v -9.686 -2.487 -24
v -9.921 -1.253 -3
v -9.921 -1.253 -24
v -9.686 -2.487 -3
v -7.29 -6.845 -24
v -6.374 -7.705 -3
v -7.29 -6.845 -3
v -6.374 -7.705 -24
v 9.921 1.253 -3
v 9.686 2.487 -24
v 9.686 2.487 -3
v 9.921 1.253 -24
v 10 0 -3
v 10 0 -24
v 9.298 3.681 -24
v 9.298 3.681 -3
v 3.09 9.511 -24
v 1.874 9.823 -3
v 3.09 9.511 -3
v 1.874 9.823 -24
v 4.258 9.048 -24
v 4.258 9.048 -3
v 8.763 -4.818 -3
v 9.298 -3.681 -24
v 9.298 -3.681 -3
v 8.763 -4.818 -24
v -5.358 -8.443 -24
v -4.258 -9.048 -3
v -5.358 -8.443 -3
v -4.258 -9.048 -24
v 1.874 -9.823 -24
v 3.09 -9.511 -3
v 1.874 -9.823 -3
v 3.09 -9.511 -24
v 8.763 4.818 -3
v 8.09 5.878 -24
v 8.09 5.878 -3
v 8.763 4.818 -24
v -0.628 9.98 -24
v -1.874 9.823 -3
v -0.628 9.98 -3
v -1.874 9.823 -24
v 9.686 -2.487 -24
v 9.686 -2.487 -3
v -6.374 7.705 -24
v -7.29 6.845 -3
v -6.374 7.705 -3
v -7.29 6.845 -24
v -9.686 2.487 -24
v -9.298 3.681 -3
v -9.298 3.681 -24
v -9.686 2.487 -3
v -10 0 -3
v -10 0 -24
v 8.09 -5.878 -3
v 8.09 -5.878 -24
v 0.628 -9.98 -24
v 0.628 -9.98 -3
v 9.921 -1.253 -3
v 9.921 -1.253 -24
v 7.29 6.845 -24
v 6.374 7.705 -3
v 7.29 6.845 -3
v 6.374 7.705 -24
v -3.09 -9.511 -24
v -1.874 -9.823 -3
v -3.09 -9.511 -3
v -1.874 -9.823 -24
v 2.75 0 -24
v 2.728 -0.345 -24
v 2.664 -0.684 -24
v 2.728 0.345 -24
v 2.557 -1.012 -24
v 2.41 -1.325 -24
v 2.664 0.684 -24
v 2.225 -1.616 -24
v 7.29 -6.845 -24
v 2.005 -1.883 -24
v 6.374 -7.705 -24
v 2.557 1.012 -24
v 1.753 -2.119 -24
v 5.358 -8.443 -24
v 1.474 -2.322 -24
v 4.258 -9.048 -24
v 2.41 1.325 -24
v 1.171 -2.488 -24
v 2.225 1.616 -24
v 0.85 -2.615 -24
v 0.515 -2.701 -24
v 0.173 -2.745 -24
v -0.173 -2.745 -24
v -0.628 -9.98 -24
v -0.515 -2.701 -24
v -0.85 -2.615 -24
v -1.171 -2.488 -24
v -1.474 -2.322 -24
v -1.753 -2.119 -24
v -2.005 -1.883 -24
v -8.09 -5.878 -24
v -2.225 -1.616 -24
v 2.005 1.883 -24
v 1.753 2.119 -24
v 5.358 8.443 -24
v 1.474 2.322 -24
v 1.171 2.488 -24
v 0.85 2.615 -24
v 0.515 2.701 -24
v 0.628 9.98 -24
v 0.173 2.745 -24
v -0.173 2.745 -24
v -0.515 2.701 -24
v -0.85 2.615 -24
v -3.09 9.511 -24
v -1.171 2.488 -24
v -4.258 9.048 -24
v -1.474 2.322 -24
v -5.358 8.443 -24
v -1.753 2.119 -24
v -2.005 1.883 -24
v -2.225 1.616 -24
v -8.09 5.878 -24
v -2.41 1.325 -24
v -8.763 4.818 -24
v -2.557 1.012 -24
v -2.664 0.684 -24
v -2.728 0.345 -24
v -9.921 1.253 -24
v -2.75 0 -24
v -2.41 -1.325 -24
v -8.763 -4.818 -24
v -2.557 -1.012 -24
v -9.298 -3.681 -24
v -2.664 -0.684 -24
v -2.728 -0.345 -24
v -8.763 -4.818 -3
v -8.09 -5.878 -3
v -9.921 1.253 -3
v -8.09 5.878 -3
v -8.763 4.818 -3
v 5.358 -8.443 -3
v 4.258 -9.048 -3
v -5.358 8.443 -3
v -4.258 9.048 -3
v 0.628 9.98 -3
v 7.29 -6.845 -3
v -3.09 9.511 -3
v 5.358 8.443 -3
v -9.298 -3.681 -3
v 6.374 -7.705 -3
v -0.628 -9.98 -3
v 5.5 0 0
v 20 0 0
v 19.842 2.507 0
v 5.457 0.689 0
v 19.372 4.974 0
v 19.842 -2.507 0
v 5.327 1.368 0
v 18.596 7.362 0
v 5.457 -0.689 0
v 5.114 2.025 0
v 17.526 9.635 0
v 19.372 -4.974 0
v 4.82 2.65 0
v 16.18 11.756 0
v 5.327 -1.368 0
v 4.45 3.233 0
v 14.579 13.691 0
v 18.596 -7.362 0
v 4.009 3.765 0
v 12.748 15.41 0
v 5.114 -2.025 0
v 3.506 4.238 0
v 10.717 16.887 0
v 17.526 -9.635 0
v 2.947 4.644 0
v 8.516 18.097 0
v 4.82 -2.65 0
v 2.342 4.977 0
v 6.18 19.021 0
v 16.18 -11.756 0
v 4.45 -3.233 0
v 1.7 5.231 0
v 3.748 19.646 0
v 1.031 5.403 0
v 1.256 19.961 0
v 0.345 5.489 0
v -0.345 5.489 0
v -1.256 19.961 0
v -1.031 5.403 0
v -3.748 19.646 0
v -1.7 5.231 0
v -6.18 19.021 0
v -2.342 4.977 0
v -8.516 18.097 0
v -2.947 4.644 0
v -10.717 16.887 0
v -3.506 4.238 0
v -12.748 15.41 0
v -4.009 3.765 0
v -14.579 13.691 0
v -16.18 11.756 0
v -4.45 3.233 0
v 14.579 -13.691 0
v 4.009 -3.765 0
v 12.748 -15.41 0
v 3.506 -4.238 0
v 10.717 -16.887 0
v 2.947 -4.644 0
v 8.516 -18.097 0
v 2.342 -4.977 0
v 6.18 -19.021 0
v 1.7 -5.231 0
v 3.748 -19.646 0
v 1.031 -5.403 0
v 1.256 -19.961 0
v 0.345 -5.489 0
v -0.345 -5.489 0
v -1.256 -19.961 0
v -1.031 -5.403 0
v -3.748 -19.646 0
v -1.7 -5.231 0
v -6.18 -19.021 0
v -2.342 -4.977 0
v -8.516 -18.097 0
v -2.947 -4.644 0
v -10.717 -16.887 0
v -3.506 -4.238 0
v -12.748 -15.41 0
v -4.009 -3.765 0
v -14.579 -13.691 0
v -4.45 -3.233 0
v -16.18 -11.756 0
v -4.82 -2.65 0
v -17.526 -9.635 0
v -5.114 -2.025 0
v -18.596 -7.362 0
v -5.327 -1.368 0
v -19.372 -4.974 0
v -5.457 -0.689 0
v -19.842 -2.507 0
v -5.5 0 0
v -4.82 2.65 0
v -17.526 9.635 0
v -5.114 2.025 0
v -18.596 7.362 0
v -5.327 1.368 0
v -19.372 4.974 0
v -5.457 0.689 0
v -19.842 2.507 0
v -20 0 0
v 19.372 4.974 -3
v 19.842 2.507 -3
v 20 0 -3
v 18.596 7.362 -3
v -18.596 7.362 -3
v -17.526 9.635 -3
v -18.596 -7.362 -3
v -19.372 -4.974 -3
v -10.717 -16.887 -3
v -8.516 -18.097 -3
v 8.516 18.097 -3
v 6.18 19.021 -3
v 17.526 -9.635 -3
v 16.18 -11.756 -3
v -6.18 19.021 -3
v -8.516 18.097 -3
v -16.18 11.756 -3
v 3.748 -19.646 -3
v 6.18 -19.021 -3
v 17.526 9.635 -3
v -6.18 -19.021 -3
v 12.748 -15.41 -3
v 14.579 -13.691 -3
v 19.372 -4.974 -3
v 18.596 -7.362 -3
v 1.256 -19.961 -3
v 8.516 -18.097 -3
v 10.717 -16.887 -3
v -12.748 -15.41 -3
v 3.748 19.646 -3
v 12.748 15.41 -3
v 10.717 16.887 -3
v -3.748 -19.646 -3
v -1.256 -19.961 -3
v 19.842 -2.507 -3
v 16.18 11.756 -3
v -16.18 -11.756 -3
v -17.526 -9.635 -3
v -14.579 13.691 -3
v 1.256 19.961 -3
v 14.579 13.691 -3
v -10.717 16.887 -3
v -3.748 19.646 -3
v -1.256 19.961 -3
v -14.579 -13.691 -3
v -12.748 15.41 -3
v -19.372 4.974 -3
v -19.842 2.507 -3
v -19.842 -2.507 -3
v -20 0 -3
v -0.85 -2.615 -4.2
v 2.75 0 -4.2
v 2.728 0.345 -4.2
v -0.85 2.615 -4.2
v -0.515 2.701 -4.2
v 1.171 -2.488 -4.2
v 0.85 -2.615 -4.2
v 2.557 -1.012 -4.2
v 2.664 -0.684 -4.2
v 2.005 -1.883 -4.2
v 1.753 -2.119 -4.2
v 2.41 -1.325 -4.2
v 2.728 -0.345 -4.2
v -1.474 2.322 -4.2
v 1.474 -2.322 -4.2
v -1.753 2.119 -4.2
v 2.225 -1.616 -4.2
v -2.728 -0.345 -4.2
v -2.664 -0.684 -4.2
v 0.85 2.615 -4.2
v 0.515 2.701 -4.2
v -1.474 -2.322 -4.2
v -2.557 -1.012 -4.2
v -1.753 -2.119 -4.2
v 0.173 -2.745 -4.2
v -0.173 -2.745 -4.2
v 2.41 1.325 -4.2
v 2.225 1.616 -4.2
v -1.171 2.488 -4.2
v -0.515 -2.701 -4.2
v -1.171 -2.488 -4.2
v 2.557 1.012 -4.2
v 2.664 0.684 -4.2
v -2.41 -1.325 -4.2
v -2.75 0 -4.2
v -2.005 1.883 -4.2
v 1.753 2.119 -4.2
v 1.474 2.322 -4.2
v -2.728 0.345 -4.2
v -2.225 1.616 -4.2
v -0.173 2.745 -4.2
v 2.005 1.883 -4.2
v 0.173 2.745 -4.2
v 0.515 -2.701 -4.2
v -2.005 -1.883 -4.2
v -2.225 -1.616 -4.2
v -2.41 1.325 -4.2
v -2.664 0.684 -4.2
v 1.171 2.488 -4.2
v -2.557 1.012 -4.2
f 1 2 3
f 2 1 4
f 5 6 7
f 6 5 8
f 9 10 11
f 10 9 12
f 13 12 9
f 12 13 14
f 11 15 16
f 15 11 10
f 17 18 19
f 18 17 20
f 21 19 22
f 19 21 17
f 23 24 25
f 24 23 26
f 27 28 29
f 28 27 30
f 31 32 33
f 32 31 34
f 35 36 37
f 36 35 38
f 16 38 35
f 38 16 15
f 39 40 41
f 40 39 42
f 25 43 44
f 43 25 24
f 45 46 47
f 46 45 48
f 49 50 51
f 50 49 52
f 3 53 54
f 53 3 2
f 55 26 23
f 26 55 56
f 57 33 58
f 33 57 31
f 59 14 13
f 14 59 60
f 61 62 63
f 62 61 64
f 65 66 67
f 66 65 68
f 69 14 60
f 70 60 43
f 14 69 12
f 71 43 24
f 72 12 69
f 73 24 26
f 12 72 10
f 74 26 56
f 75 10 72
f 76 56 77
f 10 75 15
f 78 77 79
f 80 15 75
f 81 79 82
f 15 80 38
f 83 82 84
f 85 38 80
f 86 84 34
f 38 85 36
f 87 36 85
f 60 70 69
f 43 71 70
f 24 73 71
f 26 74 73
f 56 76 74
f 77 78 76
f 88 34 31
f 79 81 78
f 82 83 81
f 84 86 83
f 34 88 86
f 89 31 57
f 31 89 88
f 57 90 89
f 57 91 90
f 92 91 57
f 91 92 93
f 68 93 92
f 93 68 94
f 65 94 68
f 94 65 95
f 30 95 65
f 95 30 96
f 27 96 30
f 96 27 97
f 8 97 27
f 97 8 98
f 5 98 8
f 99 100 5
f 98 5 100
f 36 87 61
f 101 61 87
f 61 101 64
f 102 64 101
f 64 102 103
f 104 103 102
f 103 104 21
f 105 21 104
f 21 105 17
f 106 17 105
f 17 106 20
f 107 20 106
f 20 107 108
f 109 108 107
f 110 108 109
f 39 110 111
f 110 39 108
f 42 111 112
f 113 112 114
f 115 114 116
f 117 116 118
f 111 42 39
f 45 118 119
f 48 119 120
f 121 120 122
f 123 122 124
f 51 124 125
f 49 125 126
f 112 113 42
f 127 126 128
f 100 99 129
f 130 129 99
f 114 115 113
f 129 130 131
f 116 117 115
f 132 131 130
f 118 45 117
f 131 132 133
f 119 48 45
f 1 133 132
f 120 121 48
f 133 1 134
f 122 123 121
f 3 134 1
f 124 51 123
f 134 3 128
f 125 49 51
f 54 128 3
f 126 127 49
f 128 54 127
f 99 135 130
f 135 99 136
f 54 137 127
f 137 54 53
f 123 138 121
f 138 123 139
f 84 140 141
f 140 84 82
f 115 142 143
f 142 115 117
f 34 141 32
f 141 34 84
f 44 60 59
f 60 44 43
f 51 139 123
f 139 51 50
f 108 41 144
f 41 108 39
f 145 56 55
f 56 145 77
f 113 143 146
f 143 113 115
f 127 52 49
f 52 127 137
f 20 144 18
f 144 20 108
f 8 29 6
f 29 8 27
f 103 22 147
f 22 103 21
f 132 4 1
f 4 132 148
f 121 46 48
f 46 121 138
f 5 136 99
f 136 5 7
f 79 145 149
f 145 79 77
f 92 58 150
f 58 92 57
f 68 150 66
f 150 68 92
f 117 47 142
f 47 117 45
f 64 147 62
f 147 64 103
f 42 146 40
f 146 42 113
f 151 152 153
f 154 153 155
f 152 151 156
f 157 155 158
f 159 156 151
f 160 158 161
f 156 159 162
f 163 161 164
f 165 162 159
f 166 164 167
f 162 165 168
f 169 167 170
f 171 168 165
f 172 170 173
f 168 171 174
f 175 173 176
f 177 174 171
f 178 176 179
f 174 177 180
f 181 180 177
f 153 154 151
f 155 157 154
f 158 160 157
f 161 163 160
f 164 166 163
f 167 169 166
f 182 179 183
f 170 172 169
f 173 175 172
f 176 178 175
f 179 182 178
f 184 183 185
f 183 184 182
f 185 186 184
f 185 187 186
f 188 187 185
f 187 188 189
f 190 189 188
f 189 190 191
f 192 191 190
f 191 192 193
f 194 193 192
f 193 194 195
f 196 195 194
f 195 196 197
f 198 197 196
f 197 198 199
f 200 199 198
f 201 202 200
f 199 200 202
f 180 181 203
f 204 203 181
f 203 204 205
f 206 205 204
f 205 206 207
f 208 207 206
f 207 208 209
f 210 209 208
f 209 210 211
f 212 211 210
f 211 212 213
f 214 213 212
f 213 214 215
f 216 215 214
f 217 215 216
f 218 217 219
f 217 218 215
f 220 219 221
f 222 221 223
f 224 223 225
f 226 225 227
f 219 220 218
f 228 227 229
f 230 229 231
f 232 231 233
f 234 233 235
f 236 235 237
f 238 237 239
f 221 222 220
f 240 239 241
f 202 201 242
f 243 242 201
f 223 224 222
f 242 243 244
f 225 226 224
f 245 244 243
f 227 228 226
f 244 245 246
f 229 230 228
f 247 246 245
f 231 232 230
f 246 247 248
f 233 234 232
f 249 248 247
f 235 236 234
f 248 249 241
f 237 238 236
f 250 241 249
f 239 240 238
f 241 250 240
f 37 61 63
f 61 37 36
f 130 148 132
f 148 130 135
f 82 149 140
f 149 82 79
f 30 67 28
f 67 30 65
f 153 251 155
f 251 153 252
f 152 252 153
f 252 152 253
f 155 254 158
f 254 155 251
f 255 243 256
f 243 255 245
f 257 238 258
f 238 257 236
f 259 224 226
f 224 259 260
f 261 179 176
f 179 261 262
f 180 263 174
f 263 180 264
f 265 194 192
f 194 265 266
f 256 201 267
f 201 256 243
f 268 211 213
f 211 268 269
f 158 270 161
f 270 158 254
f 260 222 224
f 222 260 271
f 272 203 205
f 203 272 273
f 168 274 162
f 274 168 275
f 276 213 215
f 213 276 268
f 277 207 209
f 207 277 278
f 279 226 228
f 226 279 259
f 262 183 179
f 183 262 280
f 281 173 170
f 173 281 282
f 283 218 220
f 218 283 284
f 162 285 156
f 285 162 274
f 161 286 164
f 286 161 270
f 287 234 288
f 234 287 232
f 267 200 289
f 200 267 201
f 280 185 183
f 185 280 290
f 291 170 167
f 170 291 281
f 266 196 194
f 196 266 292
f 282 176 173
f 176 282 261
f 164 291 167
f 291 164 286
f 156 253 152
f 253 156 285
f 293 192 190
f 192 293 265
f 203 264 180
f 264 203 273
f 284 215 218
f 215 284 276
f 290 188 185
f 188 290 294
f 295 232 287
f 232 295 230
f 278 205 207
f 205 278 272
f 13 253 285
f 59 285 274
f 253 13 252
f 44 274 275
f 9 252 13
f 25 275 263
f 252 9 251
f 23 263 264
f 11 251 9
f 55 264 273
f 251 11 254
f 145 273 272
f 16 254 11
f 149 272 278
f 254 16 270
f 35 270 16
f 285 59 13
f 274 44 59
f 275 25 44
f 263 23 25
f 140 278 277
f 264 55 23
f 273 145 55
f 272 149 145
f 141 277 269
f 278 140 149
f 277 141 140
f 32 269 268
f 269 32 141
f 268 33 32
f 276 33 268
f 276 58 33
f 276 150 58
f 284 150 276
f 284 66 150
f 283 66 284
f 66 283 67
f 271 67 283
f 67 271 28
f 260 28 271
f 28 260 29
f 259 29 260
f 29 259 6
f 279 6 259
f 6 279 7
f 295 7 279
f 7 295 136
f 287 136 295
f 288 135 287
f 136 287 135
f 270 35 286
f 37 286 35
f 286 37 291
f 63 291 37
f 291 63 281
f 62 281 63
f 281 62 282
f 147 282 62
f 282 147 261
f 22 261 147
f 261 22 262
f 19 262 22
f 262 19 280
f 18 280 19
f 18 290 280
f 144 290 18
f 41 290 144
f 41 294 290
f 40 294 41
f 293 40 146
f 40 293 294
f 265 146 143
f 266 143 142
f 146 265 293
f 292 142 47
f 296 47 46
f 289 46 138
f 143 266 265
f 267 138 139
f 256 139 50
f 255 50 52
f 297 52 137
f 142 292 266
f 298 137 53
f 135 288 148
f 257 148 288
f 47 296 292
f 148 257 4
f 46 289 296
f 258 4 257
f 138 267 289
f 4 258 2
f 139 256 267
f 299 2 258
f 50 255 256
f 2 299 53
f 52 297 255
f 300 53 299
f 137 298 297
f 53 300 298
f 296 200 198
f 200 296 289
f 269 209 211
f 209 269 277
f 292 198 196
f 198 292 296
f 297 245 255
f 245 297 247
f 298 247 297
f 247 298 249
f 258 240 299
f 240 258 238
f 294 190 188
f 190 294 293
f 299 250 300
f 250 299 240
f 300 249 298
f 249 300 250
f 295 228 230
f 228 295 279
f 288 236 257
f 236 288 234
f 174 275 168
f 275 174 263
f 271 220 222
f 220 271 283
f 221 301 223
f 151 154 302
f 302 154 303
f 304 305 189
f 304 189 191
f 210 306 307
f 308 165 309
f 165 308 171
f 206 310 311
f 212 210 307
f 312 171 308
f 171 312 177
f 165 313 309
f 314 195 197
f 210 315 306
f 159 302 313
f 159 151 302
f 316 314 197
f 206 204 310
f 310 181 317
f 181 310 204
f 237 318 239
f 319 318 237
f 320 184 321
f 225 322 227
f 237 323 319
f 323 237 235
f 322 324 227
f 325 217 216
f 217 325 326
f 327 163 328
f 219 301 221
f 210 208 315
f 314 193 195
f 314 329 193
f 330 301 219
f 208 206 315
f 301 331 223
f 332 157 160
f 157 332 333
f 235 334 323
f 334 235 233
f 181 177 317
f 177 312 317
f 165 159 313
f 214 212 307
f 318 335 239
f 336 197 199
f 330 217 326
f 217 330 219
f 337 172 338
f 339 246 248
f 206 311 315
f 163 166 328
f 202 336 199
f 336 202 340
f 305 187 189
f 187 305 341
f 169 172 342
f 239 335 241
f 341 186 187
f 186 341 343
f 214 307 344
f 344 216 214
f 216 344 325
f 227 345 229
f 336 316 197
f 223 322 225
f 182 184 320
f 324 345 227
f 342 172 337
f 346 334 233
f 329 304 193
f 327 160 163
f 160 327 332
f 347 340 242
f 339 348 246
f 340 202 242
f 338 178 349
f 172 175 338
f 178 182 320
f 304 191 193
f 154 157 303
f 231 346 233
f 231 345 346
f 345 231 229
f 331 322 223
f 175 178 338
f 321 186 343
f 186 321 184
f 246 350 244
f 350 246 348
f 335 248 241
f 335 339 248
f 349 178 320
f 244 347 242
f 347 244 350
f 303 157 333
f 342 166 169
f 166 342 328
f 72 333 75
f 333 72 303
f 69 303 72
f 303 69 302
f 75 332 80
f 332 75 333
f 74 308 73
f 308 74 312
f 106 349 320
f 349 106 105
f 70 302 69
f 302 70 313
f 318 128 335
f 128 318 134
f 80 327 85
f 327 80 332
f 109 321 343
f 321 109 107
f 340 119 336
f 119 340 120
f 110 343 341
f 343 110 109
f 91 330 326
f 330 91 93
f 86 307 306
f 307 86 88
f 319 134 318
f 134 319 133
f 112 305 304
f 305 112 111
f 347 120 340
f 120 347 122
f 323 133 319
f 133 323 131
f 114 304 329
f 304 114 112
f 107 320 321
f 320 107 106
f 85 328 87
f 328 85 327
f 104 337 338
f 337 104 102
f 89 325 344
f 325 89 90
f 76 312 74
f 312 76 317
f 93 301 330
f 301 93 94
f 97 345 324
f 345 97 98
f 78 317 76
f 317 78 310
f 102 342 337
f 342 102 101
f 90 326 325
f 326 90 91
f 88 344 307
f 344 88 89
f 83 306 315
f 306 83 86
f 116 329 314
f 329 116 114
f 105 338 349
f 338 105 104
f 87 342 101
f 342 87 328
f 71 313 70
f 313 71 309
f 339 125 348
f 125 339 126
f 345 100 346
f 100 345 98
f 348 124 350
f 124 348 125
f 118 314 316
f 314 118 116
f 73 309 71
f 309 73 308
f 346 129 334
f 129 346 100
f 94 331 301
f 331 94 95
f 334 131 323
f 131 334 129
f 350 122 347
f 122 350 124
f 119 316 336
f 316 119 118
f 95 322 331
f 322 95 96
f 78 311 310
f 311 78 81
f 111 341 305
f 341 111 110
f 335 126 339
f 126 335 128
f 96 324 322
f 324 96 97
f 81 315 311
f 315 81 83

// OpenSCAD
$fn = 50;


difference() {
	union() {
		translate(v = [0, 0, -24.0000000000]) {
			cylinder(h = 24, r = 10.0000000000);
		}
		translate(v = [0, 0, -3.0000000000]) {
			cylinder(h = 3, r = 20.0000000000);
		}
	}
	union() {
		translate(v = [0, 0, 0]) {
			rotate(a = [0, 0, 0]) {
				difference() {
					union() {
						#translate(v = [0, 0, -24.0000000000]) {
							cylinder(h = 24, r = 2.2500000000);
						}
						#translate(v = [0, 0, -4.2000000000]) {
							cylinder(h = 4.2000000000, r1 = 2.7500000000, r2 = 5.5000000000);
						}
						#translate(v = [0, 0, -24.0000000000]) {
							cylinder(h = 24, r = 2.7500000000);
						}
						#translate(v = [0, 0, -24.0000000000]) {
							cylinder(h = 24, r = 2.2500000000);
						}
					}
					union();
				}
			}
		}
	}
}
